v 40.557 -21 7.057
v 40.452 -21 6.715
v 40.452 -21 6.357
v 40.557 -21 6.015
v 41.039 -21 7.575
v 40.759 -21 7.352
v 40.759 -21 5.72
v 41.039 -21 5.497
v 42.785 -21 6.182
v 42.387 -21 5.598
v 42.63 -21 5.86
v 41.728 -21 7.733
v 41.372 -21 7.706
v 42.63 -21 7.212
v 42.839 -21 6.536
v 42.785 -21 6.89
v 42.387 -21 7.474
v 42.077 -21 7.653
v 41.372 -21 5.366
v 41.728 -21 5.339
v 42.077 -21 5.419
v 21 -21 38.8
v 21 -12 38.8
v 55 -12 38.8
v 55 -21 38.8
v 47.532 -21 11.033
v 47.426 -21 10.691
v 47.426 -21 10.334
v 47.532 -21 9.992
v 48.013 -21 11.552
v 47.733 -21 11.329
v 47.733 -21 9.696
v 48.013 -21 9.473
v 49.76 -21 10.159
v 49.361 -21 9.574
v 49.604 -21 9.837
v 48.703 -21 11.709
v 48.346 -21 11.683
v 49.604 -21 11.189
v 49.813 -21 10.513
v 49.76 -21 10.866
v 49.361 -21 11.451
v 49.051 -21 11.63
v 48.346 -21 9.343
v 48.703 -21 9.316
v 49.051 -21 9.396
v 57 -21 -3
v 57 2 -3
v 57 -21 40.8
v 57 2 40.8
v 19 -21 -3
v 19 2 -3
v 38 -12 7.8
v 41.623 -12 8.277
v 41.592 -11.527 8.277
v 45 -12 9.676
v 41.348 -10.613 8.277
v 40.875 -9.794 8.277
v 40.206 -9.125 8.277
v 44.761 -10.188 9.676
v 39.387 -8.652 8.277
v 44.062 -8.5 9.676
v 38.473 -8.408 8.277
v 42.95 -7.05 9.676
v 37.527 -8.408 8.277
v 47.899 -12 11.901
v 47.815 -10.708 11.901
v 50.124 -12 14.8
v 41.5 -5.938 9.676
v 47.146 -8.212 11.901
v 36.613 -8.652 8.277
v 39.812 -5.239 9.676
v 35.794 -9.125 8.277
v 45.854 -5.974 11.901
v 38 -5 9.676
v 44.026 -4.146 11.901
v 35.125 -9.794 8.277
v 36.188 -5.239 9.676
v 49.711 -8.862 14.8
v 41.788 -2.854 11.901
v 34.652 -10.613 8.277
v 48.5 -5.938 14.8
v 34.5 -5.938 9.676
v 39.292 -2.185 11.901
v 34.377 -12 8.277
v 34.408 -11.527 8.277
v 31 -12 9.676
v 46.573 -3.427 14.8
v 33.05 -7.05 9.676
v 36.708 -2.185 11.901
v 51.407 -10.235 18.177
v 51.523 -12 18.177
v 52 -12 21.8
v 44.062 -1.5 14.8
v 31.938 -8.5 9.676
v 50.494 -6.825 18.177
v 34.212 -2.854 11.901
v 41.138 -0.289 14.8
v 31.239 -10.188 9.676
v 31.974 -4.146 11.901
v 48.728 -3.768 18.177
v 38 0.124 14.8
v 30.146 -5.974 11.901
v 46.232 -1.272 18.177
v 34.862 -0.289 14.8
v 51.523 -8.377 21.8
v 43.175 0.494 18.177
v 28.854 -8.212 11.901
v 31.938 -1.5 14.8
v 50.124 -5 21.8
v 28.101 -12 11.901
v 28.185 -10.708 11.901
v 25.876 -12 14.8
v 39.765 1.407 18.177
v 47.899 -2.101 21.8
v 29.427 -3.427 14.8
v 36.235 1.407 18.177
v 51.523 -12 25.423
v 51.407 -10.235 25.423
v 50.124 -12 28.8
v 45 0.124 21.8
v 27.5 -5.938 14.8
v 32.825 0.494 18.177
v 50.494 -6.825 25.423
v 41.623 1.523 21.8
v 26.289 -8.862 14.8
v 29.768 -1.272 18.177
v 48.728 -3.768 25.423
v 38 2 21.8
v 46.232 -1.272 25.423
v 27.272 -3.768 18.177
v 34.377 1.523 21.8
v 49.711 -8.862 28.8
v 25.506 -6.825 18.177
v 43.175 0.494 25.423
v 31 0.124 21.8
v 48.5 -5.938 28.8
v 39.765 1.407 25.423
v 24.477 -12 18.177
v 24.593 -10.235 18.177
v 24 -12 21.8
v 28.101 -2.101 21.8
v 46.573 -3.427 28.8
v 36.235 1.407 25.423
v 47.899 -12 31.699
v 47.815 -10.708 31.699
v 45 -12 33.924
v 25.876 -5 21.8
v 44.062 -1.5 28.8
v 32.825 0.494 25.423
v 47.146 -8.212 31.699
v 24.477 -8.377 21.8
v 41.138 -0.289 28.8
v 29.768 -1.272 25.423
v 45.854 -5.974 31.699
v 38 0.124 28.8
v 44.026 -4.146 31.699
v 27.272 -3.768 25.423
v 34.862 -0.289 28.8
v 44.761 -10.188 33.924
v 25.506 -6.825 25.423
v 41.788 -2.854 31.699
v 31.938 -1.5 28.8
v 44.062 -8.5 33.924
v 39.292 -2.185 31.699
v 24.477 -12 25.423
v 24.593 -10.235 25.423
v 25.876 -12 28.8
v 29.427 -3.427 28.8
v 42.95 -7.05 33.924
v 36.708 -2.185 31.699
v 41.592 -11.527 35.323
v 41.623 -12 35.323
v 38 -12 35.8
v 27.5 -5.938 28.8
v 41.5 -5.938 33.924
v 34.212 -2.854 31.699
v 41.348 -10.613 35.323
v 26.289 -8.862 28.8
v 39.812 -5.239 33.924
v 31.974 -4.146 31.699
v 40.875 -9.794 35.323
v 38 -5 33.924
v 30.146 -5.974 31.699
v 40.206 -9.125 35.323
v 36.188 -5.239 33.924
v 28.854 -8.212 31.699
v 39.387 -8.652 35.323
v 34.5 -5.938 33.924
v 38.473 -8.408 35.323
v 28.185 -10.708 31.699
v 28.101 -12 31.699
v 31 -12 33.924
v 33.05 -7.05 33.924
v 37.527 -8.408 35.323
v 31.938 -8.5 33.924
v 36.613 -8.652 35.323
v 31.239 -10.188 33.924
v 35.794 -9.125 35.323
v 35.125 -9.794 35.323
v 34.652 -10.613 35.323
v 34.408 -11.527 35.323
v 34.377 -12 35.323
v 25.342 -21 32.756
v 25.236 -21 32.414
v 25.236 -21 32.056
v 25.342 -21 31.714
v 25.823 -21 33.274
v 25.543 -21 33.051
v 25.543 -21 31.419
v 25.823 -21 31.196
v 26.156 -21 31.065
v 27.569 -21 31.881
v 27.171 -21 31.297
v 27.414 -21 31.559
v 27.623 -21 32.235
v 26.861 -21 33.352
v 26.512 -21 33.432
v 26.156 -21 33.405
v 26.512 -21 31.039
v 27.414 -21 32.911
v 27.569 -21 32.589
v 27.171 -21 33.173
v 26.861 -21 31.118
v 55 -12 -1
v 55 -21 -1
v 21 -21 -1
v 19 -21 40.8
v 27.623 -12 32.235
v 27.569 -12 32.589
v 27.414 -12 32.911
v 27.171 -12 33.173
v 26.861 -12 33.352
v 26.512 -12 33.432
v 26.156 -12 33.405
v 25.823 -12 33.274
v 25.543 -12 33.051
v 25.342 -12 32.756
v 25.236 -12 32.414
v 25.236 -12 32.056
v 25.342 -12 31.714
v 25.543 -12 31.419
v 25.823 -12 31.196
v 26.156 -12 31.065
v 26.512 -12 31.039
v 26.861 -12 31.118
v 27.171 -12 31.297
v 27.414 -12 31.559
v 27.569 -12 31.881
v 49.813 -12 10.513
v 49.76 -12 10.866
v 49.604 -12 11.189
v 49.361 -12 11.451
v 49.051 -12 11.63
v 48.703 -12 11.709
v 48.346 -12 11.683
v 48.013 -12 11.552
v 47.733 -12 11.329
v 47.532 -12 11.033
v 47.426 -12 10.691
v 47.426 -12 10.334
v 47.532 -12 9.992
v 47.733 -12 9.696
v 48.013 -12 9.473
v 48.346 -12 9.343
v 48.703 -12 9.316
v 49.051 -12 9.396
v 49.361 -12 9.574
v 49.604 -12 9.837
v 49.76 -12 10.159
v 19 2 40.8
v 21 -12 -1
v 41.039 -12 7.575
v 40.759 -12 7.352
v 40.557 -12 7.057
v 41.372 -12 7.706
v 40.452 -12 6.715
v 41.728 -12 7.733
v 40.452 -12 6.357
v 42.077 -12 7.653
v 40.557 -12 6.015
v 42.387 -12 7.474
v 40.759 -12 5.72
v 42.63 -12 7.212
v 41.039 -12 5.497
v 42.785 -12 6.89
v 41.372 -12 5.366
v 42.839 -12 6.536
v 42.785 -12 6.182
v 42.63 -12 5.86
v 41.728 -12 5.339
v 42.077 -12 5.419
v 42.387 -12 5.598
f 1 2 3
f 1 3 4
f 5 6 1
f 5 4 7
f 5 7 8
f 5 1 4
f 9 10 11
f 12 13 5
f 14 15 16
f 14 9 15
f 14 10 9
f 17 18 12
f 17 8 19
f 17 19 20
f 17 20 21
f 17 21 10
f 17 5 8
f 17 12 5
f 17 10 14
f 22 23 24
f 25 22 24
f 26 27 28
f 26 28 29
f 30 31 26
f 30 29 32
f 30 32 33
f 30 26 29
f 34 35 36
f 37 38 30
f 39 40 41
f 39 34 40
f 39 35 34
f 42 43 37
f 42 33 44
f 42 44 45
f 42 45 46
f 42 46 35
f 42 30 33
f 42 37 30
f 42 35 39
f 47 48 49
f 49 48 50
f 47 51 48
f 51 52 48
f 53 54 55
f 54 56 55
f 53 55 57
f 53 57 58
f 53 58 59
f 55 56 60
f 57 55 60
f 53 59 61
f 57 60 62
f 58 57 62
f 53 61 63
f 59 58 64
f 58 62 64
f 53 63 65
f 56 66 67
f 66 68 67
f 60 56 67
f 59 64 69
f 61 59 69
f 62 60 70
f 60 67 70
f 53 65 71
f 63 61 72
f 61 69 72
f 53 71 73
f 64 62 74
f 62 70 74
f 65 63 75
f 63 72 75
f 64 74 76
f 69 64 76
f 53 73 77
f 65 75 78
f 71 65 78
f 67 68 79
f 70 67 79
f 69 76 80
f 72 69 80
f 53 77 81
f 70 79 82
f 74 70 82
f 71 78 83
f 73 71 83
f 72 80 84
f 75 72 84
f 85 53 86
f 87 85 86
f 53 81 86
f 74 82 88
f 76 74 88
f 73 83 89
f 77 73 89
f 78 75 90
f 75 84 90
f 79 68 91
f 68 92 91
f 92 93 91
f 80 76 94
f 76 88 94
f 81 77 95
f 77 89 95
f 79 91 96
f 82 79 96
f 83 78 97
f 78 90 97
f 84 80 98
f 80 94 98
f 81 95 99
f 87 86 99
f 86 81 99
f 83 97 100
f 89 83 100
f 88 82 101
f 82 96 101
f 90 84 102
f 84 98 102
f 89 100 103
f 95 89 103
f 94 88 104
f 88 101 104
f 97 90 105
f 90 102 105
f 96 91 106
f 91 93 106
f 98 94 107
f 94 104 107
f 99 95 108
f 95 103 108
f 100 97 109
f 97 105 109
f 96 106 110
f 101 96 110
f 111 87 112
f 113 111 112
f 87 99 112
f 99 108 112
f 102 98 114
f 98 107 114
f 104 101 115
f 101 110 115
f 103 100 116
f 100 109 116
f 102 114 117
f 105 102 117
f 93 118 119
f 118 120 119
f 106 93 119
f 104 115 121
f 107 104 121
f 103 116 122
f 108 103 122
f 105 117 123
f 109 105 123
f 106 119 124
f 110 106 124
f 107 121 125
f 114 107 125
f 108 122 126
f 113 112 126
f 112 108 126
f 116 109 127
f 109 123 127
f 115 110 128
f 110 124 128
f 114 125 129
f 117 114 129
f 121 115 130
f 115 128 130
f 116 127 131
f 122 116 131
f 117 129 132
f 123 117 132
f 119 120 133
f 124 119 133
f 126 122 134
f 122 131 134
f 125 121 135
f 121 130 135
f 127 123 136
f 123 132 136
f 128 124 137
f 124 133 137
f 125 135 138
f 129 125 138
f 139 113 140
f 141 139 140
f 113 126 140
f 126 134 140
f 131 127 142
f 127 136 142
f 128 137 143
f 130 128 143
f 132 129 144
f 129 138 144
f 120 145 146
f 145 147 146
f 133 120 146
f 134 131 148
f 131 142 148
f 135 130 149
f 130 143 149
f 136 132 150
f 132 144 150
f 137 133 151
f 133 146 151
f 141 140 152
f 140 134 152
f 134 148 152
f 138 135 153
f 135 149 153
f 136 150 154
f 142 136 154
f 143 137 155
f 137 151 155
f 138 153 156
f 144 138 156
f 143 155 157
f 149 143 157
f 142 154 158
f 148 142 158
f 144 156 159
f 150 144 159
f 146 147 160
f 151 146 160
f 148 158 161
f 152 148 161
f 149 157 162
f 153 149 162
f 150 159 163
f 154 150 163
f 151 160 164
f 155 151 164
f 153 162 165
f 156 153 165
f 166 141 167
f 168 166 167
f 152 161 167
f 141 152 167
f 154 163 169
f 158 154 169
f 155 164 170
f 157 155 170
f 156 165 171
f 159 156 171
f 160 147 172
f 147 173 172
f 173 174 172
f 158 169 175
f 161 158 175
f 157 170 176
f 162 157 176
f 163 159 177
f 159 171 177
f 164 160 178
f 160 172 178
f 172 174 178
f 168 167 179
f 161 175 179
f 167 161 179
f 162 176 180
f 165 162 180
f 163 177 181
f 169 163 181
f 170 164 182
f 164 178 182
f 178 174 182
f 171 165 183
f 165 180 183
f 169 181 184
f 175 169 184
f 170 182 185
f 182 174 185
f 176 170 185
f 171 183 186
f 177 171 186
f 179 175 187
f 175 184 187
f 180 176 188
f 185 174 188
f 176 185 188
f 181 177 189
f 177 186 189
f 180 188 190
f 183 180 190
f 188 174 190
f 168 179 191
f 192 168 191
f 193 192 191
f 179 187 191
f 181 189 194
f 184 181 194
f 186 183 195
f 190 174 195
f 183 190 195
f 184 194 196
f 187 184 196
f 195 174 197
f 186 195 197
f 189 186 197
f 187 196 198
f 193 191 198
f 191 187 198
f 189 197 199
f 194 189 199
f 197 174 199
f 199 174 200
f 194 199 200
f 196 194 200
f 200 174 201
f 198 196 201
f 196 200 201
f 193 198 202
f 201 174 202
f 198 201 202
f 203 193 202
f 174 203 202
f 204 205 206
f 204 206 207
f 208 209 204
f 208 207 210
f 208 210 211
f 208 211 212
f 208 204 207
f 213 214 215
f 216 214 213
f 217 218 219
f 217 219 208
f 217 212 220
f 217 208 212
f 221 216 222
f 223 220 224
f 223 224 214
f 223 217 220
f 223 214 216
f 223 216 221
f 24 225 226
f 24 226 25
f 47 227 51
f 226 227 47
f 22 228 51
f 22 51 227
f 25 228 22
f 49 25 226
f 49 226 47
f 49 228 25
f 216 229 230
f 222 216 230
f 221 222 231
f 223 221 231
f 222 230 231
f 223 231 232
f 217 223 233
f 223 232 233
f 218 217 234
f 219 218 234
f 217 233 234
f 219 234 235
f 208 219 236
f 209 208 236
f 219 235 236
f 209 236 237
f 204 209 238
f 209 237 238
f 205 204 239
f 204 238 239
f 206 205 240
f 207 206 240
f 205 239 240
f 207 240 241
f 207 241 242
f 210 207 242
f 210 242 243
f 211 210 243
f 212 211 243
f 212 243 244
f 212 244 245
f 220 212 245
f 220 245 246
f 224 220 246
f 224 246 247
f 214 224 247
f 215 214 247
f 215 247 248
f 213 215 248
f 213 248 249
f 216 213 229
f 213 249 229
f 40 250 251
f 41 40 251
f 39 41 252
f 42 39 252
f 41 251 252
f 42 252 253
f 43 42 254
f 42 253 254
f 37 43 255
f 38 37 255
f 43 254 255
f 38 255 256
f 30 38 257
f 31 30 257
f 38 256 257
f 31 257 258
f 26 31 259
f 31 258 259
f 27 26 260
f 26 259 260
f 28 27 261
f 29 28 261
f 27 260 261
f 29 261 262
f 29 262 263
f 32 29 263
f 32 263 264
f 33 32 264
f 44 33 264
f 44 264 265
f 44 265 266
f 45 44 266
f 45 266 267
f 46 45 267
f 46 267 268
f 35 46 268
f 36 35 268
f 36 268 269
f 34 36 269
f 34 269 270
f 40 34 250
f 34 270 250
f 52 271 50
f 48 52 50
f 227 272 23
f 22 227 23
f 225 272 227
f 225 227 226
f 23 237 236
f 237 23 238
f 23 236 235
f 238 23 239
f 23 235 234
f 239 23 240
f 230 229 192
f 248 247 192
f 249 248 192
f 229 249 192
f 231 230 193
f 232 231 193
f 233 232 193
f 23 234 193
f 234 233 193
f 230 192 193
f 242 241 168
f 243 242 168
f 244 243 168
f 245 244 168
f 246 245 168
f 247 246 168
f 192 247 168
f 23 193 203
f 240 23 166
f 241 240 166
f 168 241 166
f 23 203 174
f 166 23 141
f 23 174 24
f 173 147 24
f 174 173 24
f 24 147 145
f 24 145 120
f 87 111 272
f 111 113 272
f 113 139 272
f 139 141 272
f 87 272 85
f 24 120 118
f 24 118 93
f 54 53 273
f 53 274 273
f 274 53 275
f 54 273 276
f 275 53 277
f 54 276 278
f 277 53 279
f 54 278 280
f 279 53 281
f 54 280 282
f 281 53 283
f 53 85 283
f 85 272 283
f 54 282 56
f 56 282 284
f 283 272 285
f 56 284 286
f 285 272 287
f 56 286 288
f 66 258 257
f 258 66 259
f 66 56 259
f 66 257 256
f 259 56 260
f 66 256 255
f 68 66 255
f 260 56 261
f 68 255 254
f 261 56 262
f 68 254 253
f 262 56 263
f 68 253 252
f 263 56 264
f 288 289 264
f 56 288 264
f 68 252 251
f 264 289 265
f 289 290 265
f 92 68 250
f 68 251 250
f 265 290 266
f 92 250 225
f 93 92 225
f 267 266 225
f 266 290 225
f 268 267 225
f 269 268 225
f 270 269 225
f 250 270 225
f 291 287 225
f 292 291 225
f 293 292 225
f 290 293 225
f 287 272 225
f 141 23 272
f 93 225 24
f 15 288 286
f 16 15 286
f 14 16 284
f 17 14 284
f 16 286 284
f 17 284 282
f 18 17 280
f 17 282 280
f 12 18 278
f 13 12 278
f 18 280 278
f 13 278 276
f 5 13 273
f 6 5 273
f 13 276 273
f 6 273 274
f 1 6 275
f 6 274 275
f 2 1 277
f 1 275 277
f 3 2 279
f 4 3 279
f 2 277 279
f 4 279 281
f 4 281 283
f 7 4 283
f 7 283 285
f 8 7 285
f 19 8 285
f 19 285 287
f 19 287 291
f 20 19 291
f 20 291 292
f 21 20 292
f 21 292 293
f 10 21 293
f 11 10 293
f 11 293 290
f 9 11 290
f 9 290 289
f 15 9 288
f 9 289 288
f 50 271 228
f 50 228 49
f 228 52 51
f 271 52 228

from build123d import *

# Parameters (mm, degrees)
CUBE002_W     = 38
CUBE002_H     = 3
CUBE002_DEPTH = 43.8
CUBE001_W     = 38
CUBE001_H     = 19
CUBE001_DEPTH = 43.8
SKETCH002_W   = 38
SKETCH002_H   = 43.8
PAD002_DEPTH  = 17
SKETCH003_R   = 1.2
PAD003_DEPTH  = 9
SKETCH004_W   = 38
SKETCH004_H   = 43.8
SKETCH004_W_2 = 34
SKETCH004_H_2 = 39.8
PAD004_DEPTH  = 9


with BuildPart() as cube002:
    # cube002 → cube002 (new body)
    with BuildSketch(Plane(origin=(-19, -3, 0), x_dir=(1, 0, 0), z_dir=(0, 0, 1))):
        with Locations((19, 1.5)):
            Rectangle(CUBE002_W, CUBE002_H)
    extrude(amount=CUBE002_DEPTH)


with BuildPart() as cube001:
    # cube001 → cube001 (new body)
    with BuildSketch(Plane(origin=(-19, 0, 0), x_dir=(1, 0, 0), z_dir=(0, 0, 1))):
        with Locations((19, 9.5)):
            Rectangle(CUBE001_W, CUBE001_H)
    extrude(amount=CUBE001_DEPTH)


with BuildPart() as group003:
    # sphere001 → sphere001 (revolve)
    with BuildSketch(Plane(origin=(0, 0, 24.8), x_dir=(1, 0, 0), z_dir=(0, -1, 0))):
        with BuildLine():
            ThreePointArc((0, -14), (14, 0), (0, 14))
            Line((0, 14), (0, -14))
        make_face()
    revolve(axis=Axis((0, 0, 24.8), (0, 0, 1)))

    # intersection: intersect cube001
    add(cube001.part, mode=Mode.INTERSECT)

    # Group003: union cube002
    add(cube002.part)


with BuildPart() as pad004:
    # Pad002 base: copy of Group003
    add(group003.part)

    # Sketch002 → Pad002 (new body)
    with BuildSketch(Plane.XZ.offset(3)):
        with Locations((0, 21.9)):
            Rectangle(SKETCH002_W, SKETCH002_H)
    extrude(amount=-PAD002_DEPTH)

    # Cut: cut Group003
    add(group003.part, mode=Mode.SUBTRACT)


with BuildPart() as pad004_1:
    # Cut placement: moved
    add(pad004.part.moved(Location((38, -12, -3))))

    # Sketch003 → Pad003 (new body)
    with BuildSketch(Plane(origin=(38, -12, -3), x_dir=(1, 0, 0), z_dir=(0, -1, 0))):
        with Locations((-11.577259, 35.235146)):
            Circle(SKETCH003_R)
        with Locations((10.612975, 13.512618)):
            Circle(SKETCH003_R)
        with Locations((3.638596, 9.535999)):
            Circle(SKETCH003_R)
    extrude(amount=PAD003_DEPTH)

    # Sketch004 → Pad004 (new body)
    with BuildSketch(Plane(origin=(38, -12, -3), x_dir=(1, 0, 0), z_dir=(0, -1, 0))):
        with Locations((0, 21.9)):
            Rectangle(SKETCH004_W, SKETCH004_H)
        with Locations((0, 21.9)):
            Rectangle(SKETCH004_W_2, SKETCH004_H_2, mode=Mode.SUBTRACT)
    extrude(amount=PAD004_DEPTH)


solid = pad004_1.part
